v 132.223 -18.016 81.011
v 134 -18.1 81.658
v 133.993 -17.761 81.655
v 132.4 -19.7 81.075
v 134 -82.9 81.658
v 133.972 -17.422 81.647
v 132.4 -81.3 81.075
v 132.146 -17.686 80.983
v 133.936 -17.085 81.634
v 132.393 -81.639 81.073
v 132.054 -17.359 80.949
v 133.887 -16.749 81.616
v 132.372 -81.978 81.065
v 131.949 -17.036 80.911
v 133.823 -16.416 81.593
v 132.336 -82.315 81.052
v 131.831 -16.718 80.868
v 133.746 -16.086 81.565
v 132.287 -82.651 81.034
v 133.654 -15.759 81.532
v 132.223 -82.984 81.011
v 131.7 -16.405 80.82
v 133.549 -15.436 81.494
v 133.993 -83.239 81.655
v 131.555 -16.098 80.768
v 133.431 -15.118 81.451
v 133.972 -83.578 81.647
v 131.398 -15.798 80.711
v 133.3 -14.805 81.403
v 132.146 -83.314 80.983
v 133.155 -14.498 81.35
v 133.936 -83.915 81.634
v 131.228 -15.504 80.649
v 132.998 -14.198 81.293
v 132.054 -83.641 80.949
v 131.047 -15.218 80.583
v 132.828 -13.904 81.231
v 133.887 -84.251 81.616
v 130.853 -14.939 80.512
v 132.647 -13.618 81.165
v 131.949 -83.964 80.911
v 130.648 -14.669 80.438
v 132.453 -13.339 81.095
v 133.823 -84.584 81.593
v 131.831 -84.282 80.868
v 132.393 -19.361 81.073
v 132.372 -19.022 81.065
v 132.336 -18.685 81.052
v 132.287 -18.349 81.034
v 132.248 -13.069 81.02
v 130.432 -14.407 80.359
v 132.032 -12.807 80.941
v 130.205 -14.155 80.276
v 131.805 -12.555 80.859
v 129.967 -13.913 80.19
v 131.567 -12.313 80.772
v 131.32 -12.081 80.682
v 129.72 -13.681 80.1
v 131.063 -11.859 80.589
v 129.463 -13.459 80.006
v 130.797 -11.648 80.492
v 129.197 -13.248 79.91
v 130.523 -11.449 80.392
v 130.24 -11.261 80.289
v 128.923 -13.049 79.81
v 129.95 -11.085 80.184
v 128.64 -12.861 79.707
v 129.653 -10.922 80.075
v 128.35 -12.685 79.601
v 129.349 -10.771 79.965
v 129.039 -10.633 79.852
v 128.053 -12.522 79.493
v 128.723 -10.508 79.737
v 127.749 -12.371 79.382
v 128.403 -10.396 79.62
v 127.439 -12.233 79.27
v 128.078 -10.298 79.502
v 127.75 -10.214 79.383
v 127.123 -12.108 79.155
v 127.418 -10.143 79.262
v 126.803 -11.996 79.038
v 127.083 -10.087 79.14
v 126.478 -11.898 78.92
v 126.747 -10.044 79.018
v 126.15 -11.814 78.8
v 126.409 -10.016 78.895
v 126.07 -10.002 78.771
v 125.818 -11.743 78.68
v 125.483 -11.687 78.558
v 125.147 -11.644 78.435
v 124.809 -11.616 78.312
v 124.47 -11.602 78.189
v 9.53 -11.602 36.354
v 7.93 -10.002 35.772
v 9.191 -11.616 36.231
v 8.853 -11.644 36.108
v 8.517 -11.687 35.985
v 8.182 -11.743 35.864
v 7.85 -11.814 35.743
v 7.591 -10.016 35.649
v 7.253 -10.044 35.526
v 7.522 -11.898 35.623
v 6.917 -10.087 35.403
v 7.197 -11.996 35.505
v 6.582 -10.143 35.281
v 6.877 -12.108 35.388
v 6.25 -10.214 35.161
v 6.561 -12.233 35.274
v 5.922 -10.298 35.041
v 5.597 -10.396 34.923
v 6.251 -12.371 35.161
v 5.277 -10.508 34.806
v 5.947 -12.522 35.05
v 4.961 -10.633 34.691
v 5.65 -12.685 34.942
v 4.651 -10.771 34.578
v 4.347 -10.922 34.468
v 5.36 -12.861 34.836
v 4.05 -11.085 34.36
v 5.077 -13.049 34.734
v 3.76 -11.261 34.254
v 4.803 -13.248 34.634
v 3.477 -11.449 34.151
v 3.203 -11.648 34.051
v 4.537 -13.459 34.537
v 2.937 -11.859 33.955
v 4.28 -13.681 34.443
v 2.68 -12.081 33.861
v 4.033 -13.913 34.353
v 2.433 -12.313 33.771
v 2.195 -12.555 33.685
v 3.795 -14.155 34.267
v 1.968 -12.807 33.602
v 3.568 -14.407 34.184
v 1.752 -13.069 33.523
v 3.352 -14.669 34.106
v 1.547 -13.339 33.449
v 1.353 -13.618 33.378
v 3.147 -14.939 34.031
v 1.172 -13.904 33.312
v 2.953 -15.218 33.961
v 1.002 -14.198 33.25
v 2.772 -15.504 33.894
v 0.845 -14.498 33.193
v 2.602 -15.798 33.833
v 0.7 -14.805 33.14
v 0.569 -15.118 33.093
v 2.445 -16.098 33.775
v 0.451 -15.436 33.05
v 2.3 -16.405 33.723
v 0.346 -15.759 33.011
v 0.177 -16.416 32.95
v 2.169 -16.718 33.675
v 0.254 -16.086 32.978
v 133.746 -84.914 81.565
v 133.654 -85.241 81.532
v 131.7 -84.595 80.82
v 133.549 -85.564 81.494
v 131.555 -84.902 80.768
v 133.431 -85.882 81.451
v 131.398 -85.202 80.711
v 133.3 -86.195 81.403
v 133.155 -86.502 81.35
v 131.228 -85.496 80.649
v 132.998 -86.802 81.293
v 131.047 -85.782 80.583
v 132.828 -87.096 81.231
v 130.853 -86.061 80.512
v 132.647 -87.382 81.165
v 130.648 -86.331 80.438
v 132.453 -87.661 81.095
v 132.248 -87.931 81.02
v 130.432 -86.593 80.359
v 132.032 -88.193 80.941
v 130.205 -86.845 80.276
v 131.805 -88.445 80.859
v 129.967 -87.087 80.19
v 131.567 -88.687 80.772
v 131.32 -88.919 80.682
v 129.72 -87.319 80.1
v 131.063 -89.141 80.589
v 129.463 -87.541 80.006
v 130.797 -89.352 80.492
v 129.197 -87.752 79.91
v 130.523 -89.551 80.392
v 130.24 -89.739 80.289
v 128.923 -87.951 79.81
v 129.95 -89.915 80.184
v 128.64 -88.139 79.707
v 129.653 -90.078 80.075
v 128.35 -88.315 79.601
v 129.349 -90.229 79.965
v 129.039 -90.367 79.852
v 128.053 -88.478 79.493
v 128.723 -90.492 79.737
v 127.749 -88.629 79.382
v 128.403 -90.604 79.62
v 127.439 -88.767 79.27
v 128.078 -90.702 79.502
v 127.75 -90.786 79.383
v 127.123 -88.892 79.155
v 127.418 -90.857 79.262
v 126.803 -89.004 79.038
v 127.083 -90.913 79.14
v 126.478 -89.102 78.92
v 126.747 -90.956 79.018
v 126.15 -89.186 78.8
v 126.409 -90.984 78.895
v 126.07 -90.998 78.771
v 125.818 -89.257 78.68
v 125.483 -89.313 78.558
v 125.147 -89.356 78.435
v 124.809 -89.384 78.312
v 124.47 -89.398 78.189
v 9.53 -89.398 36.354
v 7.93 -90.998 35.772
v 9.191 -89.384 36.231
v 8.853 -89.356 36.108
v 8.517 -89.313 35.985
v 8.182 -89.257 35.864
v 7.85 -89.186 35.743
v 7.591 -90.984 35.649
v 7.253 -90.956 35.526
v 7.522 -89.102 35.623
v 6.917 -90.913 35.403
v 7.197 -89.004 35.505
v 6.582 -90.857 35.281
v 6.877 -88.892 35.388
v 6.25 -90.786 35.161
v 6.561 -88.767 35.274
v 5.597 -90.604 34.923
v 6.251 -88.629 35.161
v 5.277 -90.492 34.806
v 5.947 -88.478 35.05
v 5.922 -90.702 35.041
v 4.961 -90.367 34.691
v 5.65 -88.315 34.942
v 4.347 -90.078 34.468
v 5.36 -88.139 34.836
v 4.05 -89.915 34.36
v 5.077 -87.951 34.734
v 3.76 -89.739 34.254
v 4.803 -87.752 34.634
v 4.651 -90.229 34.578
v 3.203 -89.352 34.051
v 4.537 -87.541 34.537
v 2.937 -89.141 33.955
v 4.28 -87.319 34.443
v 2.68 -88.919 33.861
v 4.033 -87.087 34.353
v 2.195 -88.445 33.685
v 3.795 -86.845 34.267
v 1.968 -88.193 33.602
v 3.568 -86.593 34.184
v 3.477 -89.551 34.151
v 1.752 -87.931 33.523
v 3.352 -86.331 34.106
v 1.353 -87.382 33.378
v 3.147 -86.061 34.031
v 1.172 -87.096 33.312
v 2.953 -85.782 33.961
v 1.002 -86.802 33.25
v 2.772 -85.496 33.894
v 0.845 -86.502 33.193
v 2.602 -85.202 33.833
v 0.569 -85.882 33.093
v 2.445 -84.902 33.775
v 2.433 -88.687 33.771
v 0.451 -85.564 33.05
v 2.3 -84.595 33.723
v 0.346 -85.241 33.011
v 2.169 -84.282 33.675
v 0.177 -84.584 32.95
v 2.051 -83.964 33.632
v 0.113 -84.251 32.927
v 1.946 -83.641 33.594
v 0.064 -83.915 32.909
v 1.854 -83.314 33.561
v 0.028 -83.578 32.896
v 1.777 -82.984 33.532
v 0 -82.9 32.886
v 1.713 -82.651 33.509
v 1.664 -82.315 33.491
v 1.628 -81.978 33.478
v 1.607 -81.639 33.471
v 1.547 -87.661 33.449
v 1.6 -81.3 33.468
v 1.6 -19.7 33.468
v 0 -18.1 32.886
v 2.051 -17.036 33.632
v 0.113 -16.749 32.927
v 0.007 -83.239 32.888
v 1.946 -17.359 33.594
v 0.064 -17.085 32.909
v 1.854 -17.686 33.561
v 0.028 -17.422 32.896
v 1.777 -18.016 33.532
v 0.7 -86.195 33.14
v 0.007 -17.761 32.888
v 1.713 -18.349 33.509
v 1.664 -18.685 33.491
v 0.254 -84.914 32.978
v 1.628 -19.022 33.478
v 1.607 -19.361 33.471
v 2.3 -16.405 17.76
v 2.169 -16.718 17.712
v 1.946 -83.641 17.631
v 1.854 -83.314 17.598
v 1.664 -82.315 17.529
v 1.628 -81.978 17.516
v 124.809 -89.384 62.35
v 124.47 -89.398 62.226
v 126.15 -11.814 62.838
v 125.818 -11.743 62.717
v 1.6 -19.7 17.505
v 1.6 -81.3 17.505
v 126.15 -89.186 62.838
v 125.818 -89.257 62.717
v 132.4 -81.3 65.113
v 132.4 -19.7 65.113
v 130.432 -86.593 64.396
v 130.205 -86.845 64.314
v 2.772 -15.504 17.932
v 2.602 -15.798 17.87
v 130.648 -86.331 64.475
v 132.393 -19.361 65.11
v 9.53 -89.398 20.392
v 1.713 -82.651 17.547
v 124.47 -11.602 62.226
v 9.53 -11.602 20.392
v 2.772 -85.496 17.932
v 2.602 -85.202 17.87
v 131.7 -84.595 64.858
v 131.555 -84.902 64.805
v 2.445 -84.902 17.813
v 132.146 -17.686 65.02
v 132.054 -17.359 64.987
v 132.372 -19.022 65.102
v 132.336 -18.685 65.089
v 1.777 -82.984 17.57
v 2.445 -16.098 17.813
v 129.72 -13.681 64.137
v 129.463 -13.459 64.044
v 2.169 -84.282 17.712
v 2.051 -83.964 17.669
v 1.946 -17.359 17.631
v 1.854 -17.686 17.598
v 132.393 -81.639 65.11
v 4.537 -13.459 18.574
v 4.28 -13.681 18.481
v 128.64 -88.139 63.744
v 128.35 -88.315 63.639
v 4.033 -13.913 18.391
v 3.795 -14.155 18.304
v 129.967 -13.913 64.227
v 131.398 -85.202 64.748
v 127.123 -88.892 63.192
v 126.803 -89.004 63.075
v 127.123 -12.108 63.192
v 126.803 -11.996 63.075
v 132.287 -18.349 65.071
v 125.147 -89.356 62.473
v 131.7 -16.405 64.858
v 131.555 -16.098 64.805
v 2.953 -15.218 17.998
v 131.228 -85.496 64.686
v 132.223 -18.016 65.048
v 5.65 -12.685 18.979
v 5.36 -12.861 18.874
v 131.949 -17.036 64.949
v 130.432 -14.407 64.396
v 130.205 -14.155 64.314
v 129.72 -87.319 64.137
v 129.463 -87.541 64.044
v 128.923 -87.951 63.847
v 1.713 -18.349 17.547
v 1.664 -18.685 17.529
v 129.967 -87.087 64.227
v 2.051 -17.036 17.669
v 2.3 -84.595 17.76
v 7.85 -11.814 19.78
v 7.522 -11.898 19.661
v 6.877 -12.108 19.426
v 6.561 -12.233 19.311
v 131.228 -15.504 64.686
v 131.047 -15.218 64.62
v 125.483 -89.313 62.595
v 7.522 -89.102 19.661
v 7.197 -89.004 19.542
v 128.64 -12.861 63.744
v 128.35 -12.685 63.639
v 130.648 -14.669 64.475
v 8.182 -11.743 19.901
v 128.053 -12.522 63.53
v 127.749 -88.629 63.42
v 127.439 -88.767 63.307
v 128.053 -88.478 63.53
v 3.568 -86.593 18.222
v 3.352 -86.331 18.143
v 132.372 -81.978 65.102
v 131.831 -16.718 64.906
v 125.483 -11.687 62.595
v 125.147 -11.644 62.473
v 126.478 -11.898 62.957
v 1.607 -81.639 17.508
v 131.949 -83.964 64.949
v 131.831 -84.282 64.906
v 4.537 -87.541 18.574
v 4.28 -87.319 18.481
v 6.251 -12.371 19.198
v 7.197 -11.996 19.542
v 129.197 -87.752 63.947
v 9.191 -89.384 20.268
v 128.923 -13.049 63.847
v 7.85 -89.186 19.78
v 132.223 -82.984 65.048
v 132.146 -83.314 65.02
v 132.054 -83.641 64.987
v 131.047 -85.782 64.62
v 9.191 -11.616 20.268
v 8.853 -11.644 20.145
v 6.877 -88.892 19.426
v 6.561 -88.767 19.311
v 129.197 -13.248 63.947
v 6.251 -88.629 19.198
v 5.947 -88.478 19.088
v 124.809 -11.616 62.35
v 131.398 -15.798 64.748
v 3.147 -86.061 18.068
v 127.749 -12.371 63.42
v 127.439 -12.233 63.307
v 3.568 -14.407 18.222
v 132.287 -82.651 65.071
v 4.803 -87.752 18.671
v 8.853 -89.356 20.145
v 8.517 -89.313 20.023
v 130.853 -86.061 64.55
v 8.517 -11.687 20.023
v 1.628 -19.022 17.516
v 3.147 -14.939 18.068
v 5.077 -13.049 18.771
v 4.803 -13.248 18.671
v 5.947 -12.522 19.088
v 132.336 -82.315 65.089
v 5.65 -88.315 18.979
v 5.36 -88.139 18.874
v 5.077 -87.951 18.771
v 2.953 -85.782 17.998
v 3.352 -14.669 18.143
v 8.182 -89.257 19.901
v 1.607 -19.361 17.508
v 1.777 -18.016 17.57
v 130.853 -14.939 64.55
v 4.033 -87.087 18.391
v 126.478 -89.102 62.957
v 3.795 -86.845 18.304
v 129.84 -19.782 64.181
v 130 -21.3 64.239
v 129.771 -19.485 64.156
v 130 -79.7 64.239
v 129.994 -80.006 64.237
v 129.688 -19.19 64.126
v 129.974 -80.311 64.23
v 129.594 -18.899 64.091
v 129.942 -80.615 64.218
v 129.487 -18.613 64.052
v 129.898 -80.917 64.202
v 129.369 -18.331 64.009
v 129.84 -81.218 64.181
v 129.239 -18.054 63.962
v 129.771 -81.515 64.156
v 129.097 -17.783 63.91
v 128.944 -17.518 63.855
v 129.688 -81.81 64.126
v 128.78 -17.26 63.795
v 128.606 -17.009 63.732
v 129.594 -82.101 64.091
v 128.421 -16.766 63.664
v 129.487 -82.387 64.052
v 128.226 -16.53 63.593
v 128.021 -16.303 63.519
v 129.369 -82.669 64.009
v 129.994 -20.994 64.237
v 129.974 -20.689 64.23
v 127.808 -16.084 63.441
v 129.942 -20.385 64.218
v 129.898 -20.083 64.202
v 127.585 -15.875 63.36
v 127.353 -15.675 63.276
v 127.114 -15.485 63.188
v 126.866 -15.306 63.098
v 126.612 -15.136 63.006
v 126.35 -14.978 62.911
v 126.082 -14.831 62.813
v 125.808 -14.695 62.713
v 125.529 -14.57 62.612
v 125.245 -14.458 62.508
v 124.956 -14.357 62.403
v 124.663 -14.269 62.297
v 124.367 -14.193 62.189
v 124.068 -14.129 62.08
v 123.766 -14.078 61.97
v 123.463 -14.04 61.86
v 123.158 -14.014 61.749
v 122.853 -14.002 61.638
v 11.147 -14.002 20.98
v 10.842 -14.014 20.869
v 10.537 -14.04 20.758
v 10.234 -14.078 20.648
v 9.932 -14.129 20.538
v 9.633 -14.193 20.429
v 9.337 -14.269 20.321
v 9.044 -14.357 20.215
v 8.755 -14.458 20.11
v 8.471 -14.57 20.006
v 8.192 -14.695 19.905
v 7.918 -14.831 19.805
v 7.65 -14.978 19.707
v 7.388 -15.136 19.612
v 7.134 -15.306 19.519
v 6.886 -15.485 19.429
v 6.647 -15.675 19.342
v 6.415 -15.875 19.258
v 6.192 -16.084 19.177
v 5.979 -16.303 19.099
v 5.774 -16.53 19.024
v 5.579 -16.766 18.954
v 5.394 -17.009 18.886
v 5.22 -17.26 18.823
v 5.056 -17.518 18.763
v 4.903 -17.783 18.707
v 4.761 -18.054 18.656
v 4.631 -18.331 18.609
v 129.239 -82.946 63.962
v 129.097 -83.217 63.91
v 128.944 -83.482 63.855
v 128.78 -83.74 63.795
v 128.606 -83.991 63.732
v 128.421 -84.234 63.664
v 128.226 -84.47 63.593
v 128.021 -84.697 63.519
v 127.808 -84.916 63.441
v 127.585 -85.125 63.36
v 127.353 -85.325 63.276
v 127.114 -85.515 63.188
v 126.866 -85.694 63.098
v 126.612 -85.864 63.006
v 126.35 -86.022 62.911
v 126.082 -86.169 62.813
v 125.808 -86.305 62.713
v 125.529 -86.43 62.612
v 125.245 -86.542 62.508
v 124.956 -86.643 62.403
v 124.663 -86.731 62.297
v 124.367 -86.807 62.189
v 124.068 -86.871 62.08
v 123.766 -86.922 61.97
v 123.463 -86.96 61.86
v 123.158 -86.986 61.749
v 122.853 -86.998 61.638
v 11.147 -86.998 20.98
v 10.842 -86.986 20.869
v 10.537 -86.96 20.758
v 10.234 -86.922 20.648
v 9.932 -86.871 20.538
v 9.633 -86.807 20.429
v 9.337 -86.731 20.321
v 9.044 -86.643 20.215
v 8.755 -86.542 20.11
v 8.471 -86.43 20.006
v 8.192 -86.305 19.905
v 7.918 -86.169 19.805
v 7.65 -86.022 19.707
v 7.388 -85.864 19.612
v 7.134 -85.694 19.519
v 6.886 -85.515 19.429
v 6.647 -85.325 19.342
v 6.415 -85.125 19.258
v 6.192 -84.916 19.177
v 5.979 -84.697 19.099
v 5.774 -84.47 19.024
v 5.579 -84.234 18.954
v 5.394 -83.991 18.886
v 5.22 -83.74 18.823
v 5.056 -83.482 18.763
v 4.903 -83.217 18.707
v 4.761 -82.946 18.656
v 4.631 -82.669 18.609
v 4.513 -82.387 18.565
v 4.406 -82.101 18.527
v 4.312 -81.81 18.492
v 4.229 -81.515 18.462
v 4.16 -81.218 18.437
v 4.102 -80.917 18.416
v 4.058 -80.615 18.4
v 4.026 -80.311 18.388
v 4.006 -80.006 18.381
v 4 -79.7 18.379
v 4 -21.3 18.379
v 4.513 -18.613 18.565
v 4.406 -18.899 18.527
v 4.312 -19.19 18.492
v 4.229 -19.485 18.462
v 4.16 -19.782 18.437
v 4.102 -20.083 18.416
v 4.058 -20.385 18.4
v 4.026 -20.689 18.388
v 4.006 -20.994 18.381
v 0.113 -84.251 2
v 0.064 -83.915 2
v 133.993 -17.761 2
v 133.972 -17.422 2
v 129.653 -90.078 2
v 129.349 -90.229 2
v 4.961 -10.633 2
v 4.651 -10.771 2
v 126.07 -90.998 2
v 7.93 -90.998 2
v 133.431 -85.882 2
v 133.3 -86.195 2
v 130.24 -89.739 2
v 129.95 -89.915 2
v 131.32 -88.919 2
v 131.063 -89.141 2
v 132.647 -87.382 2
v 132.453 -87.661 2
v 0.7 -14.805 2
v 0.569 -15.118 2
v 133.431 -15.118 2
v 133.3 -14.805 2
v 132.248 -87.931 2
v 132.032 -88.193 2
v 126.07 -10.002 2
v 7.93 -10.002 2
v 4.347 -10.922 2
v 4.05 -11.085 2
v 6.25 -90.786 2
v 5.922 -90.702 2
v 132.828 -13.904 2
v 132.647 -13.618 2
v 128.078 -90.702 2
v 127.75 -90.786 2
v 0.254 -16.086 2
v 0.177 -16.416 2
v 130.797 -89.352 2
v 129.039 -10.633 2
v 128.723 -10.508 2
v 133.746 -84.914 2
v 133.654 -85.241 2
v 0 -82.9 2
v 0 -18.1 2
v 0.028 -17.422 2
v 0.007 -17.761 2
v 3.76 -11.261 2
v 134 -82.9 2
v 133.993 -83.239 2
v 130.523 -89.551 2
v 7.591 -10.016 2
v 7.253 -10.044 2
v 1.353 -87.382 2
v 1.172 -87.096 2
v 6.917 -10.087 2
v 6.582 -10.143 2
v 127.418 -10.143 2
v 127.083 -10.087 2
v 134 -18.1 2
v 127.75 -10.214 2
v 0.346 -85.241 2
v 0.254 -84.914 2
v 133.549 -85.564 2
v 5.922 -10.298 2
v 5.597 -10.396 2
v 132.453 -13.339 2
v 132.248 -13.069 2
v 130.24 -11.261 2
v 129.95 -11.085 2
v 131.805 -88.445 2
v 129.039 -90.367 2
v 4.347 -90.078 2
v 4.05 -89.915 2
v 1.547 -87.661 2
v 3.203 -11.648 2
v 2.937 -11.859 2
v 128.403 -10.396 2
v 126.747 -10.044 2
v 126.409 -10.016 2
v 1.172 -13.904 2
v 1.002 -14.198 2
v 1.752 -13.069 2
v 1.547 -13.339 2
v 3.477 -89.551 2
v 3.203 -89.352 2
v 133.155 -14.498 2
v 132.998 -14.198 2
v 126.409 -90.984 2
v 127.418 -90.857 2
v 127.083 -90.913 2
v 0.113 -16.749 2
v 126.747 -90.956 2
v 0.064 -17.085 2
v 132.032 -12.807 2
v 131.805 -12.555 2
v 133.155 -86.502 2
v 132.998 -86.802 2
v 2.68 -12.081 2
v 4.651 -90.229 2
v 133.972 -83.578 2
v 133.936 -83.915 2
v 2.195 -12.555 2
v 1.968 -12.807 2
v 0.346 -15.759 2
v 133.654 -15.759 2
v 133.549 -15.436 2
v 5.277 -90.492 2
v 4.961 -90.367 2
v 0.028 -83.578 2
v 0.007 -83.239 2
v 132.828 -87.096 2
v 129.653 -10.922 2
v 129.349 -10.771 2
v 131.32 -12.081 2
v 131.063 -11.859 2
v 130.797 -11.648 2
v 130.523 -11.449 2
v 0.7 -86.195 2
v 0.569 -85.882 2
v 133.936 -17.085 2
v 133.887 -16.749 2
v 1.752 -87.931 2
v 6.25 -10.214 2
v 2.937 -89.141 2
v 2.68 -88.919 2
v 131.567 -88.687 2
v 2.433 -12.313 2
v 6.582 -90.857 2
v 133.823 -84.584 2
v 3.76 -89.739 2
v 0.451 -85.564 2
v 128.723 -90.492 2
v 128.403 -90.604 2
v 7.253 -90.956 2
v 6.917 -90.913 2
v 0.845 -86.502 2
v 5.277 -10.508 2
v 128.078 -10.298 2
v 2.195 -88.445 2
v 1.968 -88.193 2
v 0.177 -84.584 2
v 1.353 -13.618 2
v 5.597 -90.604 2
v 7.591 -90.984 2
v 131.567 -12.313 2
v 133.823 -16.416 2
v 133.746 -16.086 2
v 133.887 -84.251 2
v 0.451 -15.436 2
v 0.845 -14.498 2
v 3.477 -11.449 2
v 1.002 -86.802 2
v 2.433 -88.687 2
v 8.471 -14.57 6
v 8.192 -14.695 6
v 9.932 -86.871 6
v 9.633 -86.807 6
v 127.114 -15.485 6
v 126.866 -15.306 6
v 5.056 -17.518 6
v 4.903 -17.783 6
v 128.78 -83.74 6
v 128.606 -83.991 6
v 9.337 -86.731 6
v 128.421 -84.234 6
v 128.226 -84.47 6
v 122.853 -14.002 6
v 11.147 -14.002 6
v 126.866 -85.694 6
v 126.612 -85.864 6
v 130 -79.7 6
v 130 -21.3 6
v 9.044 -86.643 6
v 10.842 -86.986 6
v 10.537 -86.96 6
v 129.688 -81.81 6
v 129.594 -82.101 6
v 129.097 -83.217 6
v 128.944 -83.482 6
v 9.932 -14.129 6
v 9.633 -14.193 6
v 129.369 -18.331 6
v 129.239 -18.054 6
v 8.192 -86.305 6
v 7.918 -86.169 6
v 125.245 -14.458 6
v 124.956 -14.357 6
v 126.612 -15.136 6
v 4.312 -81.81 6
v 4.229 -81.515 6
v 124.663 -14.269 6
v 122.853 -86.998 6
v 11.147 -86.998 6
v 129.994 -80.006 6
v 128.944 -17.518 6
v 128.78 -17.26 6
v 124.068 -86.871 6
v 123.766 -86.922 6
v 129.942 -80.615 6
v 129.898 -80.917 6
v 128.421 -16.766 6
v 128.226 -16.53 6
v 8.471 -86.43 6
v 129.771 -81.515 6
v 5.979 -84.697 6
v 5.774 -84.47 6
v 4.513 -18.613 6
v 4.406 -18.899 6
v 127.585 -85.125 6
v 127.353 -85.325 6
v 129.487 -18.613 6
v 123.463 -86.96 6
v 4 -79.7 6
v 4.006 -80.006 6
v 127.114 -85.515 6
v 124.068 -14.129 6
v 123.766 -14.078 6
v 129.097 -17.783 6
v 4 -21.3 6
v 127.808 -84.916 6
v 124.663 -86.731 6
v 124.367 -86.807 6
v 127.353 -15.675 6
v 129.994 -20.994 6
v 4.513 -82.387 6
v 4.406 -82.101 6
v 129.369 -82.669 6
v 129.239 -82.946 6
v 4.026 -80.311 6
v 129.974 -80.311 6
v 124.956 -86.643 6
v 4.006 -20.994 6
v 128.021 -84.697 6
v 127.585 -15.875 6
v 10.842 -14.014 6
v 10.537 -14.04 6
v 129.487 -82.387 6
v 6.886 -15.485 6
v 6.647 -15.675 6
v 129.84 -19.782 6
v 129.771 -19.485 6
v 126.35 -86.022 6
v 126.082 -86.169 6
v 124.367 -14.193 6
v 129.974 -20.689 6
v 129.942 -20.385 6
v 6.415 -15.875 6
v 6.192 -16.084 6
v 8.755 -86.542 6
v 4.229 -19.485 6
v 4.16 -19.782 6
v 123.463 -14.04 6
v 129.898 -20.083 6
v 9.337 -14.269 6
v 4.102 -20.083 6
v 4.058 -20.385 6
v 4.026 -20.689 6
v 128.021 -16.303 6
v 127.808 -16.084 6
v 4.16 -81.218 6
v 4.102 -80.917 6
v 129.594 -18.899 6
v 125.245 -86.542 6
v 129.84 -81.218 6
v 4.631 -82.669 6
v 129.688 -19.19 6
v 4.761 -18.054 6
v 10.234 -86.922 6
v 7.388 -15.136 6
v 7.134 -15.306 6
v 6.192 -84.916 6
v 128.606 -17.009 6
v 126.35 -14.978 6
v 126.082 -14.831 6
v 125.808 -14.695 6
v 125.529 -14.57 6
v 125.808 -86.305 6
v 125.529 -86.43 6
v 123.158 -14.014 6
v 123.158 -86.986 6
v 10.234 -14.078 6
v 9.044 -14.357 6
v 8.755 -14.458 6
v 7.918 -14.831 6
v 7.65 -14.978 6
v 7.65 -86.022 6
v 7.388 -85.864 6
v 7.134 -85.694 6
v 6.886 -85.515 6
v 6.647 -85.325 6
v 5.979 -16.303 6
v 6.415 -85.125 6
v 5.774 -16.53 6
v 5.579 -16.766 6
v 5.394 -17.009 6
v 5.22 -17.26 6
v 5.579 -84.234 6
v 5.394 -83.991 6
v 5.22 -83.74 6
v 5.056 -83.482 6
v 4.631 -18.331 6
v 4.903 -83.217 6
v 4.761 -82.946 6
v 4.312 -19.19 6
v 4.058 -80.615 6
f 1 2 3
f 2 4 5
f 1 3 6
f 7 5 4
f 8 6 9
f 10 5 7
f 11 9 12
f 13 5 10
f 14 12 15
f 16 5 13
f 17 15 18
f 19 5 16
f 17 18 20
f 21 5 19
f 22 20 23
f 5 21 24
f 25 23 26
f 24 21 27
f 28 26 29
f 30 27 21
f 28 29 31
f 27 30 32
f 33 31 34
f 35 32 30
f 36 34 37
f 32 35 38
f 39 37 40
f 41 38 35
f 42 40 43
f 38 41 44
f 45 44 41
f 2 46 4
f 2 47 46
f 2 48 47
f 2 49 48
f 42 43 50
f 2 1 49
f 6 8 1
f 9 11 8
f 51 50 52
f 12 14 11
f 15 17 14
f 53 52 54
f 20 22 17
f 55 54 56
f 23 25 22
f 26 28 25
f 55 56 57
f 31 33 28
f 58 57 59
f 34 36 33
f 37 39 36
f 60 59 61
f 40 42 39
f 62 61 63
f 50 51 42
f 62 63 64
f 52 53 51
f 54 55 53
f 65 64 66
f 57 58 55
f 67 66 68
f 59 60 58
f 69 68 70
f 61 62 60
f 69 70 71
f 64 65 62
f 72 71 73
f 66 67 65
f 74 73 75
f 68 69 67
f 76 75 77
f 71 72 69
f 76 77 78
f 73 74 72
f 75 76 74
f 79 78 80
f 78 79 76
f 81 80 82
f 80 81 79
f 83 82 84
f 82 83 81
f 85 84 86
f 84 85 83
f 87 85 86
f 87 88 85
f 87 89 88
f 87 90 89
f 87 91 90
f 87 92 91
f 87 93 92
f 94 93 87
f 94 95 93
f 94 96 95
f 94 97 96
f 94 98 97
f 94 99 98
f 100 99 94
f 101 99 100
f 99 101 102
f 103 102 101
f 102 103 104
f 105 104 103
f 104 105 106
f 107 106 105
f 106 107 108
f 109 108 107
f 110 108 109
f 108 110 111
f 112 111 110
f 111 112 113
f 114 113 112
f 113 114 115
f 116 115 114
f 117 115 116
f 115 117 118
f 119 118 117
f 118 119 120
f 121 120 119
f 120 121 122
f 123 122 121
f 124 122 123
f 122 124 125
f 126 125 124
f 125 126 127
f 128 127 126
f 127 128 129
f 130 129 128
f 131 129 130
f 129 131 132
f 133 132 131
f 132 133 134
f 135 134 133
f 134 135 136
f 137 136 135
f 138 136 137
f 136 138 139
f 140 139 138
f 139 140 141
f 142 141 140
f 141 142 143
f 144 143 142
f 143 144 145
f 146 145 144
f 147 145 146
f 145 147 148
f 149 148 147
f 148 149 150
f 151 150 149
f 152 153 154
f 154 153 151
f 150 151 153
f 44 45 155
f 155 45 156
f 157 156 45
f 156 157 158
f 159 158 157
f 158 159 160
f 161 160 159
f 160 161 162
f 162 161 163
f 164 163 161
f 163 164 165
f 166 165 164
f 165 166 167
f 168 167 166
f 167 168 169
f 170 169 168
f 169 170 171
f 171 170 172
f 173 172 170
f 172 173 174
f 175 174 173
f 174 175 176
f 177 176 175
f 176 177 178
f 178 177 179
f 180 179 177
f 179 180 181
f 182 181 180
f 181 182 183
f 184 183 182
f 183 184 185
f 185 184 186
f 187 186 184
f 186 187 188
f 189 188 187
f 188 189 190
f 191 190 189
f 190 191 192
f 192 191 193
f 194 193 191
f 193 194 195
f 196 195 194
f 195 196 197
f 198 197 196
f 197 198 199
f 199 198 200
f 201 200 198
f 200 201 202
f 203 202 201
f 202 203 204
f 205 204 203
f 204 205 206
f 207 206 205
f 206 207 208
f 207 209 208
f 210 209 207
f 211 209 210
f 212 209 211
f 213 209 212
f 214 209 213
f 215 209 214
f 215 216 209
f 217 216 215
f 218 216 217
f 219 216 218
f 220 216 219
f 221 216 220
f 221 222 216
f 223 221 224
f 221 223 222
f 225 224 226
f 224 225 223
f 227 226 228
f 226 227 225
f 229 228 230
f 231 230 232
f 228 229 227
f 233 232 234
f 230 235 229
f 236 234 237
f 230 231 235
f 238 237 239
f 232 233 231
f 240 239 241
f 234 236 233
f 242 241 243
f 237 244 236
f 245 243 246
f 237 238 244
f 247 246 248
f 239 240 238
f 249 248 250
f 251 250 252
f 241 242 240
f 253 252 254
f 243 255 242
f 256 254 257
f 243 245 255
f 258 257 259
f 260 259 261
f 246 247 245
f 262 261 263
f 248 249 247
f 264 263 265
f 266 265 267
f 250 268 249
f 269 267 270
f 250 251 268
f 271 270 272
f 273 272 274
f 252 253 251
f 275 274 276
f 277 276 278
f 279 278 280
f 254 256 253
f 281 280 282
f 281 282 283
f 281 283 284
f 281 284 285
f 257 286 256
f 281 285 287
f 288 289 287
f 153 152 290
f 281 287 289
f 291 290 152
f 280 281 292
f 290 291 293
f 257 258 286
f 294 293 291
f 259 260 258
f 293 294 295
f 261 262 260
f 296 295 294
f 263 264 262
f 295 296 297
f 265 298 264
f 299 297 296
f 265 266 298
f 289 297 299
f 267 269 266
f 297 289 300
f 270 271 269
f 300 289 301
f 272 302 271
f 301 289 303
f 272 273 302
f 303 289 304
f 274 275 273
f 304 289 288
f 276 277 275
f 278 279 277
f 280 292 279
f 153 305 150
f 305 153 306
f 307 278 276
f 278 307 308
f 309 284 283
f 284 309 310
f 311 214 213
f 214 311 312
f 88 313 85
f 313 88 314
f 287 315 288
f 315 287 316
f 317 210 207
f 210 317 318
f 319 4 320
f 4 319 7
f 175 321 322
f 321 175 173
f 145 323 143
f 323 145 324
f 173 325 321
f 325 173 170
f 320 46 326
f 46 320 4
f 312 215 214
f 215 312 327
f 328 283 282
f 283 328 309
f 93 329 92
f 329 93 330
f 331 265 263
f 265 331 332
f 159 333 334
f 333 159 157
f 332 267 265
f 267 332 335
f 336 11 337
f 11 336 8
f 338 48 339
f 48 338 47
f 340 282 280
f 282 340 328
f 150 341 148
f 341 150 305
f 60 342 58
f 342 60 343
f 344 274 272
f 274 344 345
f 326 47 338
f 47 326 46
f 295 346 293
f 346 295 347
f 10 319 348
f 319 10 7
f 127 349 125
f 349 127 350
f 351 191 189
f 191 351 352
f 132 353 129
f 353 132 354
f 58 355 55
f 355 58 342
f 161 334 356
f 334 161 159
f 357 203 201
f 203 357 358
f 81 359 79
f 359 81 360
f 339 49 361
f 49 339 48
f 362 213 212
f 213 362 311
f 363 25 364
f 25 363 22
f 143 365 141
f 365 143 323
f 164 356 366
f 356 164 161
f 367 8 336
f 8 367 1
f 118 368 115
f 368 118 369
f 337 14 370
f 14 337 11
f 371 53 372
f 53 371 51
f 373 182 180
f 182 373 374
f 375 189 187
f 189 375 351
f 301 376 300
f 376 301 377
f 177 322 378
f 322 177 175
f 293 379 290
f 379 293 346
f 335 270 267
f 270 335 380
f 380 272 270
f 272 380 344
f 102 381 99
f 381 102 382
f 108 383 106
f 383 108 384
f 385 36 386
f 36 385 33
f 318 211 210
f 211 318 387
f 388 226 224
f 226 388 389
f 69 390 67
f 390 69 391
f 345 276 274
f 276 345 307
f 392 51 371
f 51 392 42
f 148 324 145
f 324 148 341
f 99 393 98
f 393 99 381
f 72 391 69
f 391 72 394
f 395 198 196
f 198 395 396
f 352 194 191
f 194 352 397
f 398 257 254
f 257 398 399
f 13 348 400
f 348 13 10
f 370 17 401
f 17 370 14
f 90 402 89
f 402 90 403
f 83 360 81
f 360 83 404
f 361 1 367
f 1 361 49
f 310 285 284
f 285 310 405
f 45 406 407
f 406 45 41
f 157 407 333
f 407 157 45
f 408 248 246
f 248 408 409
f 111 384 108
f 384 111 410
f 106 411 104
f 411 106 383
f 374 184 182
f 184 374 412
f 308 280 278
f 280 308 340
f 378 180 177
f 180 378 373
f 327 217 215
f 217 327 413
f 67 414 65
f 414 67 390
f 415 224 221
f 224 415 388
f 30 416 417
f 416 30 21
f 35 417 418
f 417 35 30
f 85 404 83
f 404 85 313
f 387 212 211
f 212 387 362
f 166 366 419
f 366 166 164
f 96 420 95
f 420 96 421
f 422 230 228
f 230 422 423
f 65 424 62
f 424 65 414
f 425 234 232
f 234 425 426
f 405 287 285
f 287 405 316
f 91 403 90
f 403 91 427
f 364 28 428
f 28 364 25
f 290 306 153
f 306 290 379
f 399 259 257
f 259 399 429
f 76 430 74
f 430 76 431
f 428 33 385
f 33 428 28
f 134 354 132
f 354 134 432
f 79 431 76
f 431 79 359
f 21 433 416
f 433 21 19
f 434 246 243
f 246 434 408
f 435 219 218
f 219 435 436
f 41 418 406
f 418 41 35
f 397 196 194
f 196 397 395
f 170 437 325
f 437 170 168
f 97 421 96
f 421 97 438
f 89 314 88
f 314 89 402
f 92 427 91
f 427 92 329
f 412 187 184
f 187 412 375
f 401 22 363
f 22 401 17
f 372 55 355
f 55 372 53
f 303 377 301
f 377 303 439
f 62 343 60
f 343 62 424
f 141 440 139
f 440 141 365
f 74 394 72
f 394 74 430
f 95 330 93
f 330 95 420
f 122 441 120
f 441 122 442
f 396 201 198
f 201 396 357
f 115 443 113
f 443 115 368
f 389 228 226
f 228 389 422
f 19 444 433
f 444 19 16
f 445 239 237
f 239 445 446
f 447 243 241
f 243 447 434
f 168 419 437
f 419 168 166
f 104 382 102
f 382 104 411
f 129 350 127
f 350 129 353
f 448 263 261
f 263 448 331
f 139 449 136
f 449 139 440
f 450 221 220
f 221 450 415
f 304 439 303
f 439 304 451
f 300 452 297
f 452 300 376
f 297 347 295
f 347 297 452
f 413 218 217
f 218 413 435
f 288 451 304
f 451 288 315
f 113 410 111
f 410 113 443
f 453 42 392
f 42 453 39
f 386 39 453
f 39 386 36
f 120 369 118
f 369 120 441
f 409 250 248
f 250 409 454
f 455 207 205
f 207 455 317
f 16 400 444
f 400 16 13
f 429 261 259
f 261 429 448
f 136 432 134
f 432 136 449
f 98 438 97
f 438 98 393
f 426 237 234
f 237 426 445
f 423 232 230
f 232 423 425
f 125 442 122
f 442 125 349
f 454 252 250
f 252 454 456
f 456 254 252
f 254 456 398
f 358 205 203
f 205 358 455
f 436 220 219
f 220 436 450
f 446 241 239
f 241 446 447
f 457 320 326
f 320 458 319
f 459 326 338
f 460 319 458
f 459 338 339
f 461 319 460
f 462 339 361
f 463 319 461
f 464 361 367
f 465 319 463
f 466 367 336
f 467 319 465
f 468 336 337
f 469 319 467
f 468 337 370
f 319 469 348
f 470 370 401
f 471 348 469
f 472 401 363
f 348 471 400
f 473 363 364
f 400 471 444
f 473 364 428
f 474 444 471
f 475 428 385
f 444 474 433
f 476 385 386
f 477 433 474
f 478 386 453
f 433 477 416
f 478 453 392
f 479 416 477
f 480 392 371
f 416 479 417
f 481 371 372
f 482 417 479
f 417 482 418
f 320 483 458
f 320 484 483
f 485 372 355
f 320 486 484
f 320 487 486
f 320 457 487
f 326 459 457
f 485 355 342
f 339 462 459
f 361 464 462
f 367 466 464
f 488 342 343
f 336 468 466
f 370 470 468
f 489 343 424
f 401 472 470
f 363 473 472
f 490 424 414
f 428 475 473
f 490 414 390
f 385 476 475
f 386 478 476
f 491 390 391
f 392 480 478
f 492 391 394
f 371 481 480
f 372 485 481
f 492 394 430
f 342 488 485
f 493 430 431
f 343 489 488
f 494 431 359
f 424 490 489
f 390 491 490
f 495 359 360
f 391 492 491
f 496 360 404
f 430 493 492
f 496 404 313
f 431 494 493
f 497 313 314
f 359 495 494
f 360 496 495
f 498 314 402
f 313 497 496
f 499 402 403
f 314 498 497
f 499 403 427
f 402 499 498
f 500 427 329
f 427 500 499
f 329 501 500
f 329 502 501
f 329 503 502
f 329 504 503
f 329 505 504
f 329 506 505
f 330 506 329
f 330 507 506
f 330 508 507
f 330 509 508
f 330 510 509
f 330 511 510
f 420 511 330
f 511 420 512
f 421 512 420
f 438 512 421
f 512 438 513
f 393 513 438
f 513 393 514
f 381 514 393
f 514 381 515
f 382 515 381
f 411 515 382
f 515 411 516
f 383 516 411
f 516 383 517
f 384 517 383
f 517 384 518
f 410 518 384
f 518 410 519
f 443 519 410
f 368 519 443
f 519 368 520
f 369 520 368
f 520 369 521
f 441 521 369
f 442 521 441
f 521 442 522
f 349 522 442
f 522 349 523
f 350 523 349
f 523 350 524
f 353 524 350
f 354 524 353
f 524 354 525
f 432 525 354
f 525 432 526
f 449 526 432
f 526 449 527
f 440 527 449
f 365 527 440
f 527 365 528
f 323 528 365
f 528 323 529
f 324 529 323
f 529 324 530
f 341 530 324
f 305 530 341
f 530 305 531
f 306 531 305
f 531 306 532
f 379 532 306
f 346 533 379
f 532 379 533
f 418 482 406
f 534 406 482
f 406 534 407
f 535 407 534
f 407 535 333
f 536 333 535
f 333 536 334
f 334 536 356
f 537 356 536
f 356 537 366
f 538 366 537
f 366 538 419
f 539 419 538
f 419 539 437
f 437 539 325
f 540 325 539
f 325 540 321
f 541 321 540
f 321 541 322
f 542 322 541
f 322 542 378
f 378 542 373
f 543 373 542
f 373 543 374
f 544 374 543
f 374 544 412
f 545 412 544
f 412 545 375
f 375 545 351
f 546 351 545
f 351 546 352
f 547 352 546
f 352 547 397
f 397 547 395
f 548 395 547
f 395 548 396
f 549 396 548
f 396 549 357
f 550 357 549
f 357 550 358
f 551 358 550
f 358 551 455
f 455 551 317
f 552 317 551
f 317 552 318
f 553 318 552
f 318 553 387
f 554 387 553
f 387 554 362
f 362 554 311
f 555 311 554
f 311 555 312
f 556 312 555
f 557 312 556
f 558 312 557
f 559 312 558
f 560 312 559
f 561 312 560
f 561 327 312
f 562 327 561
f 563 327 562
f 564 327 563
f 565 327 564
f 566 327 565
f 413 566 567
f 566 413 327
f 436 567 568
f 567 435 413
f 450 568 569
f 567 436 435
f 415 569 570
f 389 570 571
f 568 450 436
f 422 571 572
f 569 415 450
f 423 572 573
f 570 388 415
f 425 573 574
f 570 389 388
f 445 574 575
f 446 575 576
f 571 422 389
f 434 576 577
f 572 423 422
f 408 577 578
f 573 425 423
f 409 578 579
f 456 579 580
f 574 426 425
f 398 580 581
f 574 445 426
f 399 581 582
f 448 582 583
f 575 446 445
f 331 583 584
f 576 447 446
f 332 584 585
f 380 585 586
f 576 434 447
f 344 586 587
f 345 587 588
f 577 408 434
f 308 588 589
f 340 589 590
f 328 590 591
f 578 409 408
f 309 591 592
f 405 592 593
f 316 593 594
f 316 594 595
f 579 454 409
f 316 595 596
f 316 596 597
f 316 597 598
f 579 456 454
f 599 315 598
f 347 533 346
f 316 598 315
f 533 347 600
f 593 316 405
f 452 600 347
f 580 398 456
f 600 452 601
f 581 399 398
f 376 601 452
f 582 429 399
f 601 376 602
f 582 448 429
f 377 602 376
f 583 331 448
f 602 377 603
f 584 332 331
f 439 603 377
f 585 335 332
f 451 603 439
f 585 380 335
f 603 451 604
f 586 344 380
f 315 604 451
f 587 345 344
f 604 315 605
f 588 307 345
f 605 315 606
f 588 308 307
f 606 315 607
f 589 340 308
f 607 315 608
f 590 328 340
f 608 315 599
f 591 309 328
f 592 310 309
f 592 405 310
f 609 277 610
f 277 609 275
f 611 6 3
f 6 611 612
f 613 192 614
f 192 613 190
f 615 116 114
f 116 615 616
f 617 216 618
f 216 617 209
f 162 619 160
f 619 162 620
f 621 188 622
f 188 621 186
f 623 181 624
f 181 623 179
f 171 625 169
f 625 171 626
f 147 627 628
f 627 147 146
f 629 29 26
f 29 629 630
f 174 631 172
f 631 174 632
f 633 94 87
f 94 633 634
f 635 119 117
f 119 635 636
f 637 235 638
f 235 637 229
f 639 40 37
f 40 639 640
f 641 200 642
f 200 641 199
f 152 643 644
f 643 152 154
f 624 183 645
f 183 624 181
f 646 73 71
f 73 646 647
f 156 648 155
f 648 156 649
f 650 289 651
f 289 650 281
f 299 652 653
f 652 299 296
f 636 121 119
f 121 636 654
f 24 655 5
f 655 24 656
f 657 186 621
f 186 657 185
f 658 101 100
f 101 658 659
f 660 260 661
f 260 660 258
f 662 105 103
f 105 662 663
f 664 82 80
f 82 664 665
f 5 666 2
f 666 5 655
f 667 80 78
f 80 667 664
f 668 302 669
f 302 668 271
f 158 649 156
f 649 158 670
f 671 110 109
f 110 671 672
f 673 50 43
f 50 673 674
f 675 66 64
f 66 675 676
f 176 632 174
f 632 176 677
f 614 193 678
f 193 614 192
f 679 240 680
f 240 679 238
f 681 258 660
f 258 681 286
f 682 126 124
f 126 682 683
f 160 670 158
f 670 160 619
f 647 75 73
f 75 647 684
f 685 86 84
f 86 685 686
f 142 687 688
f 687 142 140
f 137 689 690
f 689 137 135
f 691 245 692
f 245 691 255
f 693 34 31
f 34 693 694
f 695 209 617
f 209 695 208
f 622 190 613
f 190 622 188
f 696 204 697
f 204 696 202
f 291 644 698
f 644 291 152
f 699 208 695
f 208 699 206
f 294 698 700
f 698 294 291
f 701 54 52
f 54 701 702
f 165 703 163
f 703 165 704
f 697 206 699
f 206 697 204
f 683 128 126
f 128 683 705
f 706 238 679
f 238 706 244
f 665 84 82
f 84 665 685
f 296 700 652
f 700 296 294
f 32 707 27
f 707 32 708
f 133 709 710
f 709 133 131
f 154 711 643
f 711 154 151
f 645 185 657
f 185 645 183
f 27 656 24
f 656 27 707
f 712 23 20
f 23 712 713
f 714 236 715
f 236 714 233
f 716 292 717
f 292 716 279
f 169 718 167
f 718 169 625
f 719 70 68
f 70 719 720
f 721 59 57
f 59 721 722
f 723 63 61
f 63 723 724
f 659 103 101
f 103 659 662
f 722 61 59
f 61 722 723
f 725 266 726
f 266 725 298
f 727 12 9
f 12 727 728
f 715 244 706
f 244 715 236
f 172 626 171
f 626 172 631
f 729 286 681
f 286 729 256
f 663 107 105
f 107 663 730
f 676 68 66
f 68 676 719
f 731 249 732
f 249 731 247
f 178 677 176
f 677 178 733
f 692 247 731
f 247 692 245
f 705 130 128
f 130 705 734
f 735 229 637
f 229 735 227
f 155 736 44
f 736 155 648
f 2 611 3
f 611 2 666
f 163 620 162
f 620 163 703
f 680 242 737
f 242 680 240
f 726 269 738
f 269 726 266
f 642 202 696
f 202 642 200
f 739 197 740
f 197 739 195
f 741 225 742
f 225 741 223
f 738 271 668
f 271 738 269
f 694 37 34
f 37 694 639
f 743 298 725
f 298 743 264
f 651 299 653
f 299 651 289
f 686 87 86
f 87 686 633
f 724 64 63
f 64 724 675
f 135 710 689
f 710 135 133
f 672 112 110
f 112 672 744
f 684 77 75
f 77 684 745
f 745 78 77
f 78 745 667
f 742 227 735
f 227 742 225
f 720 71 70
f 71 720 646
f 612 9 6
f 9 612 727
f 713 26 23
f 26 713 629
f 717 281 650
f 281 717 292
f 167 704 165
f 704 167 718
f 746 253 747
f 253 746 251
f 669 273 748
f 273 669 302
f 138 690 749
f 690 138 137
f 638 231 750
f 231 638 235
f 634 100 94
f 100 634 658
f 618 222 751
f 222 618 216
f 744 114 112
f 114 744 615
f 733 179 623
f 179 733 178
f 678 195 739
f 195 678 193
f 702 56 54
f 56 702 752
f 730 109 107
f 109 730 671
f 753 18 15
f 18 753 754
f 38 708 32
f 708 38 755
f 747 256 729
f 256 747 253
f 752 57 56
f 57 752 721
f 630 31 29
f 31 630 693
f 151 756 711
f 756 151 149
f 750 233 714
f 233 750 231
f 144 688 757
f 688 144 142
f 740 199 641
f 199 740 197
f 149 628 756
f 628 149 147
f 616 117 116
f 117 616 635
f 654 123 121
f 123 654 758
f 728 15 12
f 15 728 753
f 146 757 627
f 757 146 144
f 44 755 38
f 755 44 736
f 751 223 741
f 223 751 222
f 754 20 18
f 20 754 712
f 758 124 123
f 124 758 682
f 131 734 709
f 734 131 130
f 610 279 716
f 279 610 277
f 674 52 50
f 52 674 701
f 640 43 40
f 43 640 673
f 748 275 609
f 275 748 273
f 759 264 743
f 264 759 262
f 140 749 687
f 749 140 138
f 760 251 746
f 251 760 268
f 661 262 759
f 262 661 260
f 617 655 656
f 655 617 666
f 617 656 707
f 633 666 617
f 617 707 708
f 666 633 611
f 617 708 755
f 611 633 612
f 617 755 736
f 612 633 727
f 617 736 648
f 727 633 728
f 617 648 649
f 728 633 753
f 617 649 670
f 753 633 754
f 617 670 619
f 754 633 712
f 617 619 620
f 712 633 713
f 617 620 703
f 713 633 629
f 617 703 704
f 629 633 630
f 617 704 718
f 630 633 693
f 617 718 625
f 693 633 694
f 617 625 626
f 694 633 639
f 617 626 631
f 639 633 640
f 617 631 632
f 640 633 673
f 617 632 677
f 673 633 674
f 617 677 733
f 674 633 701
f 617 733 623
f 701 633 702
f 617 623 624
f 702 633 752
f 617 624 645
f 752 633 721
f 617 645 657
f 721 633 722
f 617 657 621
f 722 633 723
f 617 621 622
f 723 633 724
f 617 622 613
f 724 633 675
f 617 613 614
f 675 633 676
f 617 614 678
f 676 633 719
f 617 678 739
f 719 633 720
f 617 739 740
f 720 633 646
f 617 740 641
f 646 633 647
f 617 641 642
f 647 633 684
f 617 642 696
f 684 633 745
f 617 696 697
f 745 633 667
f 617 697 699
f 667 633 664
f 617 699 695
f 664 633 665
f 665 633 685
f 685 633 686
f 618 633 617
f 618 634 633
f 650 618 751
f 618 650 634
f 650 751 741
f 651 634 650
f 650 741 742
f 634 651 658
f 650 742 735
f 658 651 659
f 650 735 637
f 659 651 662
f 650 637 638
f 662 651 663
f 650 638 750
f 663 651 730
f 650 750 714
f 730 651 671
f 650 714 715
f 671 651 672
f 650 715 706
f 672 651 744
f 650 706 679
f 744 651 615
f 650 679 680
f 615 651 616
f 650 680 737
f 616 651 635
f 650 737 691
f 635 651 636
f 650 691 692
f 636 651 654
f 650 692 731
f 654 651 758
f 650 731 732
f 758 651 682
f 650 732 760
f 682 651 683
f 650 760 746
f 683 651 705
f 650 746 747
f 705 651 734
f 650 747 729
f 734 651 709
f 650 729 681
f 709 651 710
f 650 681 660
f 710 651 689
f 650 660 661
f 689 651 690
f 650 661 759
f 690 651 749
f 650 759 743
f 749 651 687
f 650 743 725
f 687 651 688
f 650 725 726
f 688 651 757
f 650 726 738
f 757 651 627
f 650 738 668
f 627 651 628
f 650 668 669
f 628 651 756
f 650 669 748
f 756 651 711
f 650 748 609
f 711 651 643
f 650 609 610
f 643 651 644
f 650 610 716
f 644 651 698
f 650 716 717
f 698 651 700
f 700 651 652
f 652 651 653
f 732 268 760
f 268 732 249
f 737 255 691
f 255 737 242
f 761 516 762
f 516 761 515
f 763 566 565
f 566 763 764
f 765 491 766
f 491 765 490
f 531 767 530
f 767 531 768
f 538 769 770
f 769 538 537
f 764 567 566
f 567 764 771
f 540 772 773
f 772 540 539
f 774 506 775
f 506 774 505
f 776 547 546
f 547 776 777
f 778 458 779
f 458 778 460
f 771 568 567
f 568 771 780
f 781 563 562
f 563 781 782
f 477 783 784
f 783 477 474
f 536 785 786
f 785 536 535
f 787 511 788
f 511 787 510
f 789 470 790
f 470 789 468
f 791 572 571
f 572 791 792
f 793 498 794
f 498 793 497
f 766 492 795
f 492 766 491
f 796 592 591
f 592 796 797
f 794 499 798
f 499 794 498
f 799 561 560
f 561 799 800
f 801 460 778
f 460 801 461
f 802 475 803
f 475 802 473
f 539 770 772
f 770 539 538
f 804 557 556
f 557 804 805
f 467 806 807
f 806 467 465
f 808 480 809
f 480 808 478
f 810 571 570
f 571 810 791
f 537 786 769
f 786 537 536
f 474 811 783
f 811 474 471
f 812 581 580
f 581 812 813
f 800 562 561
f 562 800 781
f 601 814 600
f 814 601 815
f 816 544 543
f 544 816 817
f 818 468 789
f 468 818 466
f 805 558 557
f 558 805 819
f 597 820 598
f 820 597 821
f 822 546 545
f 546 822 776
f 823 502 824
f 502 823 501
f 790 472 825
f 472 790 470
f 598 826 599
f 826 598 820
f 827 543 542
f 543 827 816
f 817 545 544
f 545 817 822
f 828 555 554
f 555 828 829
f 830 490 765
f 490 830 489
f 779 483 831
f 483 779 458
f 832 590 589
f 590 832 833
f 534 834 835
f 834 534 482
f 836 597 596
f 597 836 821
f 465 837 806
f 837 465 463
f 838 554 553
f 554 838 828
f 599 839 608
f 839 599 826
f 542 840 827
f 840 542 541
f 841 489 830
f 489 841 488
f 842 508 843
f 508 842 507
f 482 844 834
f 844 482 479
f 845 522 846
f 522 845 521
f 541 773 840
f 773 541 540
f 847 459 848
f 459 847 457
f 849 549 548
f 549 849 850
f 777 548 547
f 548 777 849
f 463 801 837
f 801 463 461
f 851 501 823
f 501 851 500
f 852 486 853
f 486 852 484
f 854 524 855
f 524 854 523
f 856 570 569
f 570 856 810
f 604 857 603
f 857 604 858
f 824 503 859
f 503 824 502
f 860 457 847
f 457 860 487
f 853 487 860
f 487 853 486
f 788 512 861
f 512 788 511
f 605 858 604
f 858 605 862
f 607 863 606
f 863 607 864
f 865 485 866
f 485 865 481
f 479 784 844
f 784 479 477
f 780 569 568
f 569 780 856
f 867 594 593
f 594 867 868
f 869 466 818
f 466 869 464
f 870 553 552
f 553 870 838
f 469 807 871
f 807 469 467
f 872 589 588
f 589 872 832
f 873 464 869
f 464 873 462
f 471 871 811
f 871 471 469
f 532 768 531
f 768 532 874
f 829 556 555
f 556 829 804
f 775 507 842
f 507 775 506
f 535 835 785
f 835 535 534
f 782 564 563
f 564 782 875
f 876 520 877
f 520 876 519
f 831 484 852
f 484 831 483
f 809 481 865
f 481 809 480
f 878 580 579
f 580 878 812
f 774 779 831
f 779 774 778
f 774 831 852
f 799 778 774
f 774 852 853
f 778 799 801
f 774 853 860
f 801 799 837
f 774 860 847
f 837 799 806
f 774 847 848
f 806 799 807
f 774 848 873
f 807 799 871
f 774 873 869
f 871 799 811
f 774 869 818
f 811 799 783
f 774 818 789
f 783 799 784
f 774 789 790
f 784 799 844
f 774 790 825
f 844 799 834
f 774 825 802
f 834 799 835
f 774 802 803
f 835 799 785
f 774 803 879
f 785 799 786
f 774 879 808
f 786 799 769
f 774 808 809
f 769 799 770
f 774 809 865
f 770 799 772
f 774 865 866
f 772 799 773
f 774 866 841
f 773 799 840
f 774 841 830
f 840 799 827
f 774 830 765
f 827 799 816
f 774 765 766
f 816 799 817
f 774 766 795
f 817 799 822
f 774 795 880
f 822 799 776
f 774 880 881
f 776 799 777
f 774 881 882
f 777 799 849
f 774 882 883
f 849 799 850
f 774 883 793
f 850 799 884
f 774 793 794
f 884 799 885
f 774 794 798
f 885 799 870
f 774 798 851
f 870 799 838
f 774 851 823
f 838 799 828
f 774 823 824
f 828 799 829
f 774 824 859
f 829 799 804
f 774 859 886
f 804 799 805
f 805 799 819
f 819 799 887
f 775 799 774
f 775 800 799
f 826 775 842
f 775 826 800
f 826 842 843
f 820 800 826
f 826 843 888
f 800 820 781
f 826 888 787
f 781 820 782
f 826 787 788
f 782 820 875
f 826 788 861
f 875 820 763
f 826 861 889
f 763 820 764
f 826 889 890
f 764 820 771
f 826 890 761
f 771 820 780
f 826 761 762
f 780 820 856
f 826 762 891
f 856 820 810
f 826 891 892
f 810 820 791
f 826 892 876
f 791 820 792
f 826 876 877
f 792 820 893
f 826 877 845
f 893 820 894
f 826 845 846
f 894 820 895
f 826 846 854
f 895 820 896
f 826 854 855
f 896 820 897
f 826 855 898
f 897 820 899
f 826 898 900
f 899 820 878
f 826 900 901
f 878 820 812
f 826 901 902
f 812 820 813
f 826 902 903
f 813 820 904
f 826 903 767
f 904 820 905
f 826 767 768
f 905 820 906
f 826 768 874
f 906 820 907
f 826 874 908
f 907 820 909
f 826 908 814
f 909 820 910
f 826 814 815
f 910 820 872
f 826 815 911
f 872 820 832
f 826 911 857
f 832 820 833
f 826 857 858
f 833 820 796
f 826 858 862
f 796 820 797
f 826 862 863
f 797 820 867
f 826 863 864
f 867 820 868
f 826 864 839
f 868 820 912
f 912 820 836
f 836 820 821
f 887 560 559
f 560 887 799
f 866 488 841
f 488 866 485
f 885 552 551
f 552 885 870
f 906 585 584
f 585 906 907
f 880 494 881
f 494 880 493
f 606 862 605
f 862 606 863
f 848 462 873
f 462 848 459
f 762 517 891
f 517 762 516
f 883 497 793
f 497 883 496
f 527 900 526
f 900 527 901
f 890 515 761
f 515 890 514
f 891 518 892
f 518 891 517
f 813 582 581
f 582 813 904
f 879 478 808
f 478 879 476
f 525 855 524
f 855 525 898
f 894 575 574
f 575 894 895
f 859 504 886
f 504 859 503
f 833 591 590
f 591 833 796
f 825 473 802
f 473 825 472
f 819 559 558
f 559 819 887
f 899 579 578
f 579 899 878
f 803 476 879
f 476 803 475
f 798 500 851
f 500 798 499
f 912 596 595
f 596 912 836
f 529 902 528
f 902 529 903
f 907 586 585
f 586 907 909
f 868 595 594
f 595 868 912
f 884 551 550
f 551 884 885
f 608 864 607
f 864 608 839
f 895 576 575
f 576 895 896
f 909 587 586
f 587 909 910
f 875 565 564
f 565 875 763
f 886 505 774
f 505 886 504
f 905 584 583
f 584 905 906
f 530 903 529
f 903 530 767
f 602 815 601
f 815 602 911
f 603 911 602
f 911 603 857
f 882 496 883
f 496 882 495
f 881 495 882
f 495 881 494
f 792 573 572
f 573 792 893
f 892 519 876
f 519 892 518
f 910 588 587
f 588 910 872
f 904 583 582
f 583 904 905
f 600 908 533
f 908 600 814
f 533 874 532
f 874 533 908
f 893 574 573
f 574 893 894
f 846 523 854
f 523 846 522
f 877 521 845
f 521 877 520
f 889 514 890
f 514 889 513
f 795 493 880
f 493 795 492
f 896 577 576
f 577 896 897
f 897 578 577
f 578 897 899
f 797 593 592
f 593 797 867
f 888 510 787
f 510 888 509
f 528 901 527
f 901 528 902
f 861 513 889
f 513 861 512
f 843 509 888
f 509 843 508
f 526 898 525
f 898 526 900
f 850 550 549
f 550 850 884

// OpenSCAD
// file: box_and_lid.scad
/* [Box Info] */

// Width of printed wall. Take into account that in the insertion this will be half of the value inserted (mm)
wall_width = 3; // 0.1

// Box length (mm)
box_length = 40;

// Box height (mm)
box_height = 40; // 0.1

// Box width (mm)
box_width = 53; // 0.

// Insertion length (mm). Insertion between both parts
insertion = 6;

// Inclination between both parts (degrees)
inclination = 15;

// Parameter to change the size of the lid and base (divides the total height between both of them based on this param). Check that both of the sides have enough space for the insertion to be printed.
base_lid_relation = 0.75;

/* [Printer settings] */
// Printer tolerance. Printers are not perfect, pieces need a bit of margin to fit. (mm)
tolerance = 0.4;

/* [Other] */

export = "N"; //[L:Lid, B:Base, A:Assembly, N:None]
// $fn resolution
fn = 150;


module filleted_rectangle(size_x,size_y,size_z, round_rad)
{
    hull()
    {   
        linear_extrude(height = size_z) translate([round_rad,round_rad,0]) circle(d= round_rad*2, $fn = fn);
        linear_extrude(height = size_z) translate([size_x-round_rad,round_rad,0]) circle(d= round_rad*2, $fn = fn);
        linear_extrude(height = size_z) translate([round_rad,size_y-round_rad,0]) circle(d= round_rad*2, $fn = fn);
        linear_extrude(height = size_z) translate([size_x-round_rad,size_y-round_rad,0]) circle(d= round_rad*2, $fn = fn);
    }
}

rotation = inclination; // atan2(insertion*3, box_length);

// Tolerance expands the insertion part
module box_base(box_width_in, box_length_in, box_height_in, wall_width_in, tolerance_in = 0.0)
{
    difference()
    {
        union()
        {
            // Base box
            difference()
            {   
                translate([-tolerance_in,-tolerance_in,-tolerance_in])
                filleted_rectangle(box_width_in+tolerance_in*2, box_length_in+tolerance_in*2, box_height_in+tolerance_in*2, box_length_in/10);

                rotate([0,rotation,0])
                translate([-wall_width_in*200,-wall_width_in*200, box_height_in*base_lid_relation])
                cube([box_width_in*300, box_length_in*300, box_height_in*200]);
            }

            // Insertion extension
            difference()
            {
                insertion_x = box_width_in - wall_width_in + tolerance_in*2; // Half wall width for each side
                insertion_y = box_length_in - wall_width_in + tolerance_in*2; // Half wall width for each side
                insertion_z = box_height_in;

                translate([wall_width_in/2 - tolerance_in, wall_width_in/2 - tolerance_in])
                filleted_rectangle(insertion_x, insertion_y, insertion_z, box_length_in/10);

                rotate([0,rotation,0])
                translate([-wall_width_in*200,-wall_width_in*200, box_height_in*base_lid_relation+insertion])
                cube([box_width_in*300, box_length_in*300, box_height_in*200]);
            }
        }

        // Empty innner of the box
        inner_x = box_width_in - wall_width_in*2 - tolerance_in*2;
        inner_y = box_length_in - wall_width_in*2 - tolerance_in*2;
        inner_z = box_height_in;
        translate([wall_width_in + tolerance_in, wall_width_in + tolerance_in, wall_width_in])
        filleted_rectangle(inner_x, inner_y, box_height_in, inner_y/10);
    }
    
}

module box_lid(box_width_in, box_length_in, box_height_in, wall_width_in, tolerance_in)
{
    difference()
    {
        // Base box
        difference()
        {
            filleted_rectangle(box_width_in, box_length_in, box_height_in, box_length_in/10);

            translate([box_width_in,0,box_height_in])
            rotate([180,0,180])
            box_base(box_width_in, box_length_in, box_height_in, wall_width_in, tolerance_in);
        }

        // Empty innner of the box
        inner_x = box_width_in - wall_width_in*2;
        inner_y = box_length_in - wall_width_in*2;
        inner_z = box_height_in;
        translate([wall_width_in, wall_width_in, wall_width_in])
        filleted_rectangle(inner_x, inner_y, box_height_in, inner_y/10);
    }
}


if (export == "L")
{
    translate([box_width,0,box_height])
    rotate([180,0,180])
    box_lid(box_width, box_length, box_height, wall_width, tolerance);
}
else if (export == "B")
{
    box_base(box_width, box_length, box_height, wall_width, 0);
}
else if (export == "A")
{
    // Display assembly
    color("red", 1)
    // translate([box_width,0,box_height])
    // rotate([180,0,180])
    translate([0,10+box_length,0])
    box_lid(box_width, box_length, box_height, wall_width, tolerance);

    color("orange", 1) box_base(box_width, box_length, box_height, wall_width, 0);
}
else
{

}

// Reference as bounding box
//color("black", 0.1) filleted_rectangle(box_width, box_length, box_height, box_length/10);
// main file
include <./box_and_lid.scad>


/* [Box Info] */

box_width = 134;
box_length = 81;
box_height = 153;
wall_width = 4;
tolerance = 0.4;
extra_height = 100;
insertion = 15;
inclination = 20;

/* [Other] */
export_filled = "L"; //[L:Lid, B:Base, A:Assembly, N:None]

module little_jar(extra_height_in)
{
    diameter = 45 + tolerance * 1;
    height = 52 + tolerance * 1;
    cylinder(h = height + extra_height_in, d = diameter, $fn = fn);
}

module bottle(extra_height_in)
{
    diameter = 49 + tolerance * 2;
    height = 139 + tolerance * 2;
    cylinder(h = height + extra_height_in, d = diameter, $fn = fn);
}

module tape(extra_height_in)
{
    diameter = 36 + tolerance * 3;
    height = 16*2 + tolerance * 3;
    cylinder(h = height + extra_height_in, d = diameter, $fn = fn);
}

module paper(extra_height_in)
{
    paper_x = 78 + tolerance * 3;
    paper_z = 55 + tolerance * 3;
    paper_y = 30 + tolerance * 3;
    cube([paper_x, paper_y, paper_z + extra_height_in]);
}

module aquarelles_box(extra_height_in)
{
    paper_x = 20 + tolerance * 2;
    paper_y = 64 + tolerance * 2;
    paper_z = 130 + tolerance * 3;
    cube([paper_x, paper_y, paper_z + extra_height_in]);
}

module bandeja(extra_height_in)
{
    paper_x = 86 + tolerance * 2;
    paper_y = 15 + tolerance * 2;
    cube([paper_x, paper_y, paper_x + extra_height_in]);
}

module lapiz(extra_height_in)
{
    cylinder(h = box_height - wall_width*2, d = 11, $fn = fn);
}

module stuff(extra_height_in)
{
    color("red")
    translate([wall_width*1.7, wall_width*1.7, wall_width])
    union()
    {
        translate([0, 1, 0]) aquarelles_box(extra_height_in);

        translate([24, 0, 0]) bandeja(extra_height_in);

        translate([48, 43, 0]) bottle(extra_height_in);

        translate([98, 42, 0]) tape(extra_height_in);

        translate([98, 42, 36]) little_jar(extra_height_in);

        translate([30, 0, 90]) paper(extra_height_in);

        translate([75, 23, 0]) lapiz(extra_height_in);

        translate([75, 61, 0]) lapiz(extra_height_in);

        //translate([76, 61, 0]) lapiz(extra_height_in);

        //translate([76, 61, 0]) lapiz(extra_height_in);
    }
}

module base()
{
    union()
    {   
        box_base(box_width, box_length, box_height, wall_width, 0);
        difference()
        {
            filleted_rectangle(box_width, box_length, box_height*3/7, box_length/10);
            stuff(extra_height);
        }
    }
}


module lid()
{
    translate([0,-10,155])
    rotate([-180,0,0])
    difference()
    {
        translate([box_width,0,box_height])
        rotate([180,0,180])
        union()
        {
            //filleted_rectangle(box_width, box_length, box_height*4/7*(1-base_lid_relation), box_length/10);
            box_lid(box_width, box_length, box_height, wall_width, tolerance);
        }
        //stuff(0);
    }
}

if (export_filled == "L")
{
    lid();
}
else if (export_filled == "B")
{
    base();
}
else if (export_filled == "A")
{
    // Display assembly
    color("red", 1)
    translate([0,-10,0])
    lid();
    color("orange", 1) 
    base();
}
else
{

}
